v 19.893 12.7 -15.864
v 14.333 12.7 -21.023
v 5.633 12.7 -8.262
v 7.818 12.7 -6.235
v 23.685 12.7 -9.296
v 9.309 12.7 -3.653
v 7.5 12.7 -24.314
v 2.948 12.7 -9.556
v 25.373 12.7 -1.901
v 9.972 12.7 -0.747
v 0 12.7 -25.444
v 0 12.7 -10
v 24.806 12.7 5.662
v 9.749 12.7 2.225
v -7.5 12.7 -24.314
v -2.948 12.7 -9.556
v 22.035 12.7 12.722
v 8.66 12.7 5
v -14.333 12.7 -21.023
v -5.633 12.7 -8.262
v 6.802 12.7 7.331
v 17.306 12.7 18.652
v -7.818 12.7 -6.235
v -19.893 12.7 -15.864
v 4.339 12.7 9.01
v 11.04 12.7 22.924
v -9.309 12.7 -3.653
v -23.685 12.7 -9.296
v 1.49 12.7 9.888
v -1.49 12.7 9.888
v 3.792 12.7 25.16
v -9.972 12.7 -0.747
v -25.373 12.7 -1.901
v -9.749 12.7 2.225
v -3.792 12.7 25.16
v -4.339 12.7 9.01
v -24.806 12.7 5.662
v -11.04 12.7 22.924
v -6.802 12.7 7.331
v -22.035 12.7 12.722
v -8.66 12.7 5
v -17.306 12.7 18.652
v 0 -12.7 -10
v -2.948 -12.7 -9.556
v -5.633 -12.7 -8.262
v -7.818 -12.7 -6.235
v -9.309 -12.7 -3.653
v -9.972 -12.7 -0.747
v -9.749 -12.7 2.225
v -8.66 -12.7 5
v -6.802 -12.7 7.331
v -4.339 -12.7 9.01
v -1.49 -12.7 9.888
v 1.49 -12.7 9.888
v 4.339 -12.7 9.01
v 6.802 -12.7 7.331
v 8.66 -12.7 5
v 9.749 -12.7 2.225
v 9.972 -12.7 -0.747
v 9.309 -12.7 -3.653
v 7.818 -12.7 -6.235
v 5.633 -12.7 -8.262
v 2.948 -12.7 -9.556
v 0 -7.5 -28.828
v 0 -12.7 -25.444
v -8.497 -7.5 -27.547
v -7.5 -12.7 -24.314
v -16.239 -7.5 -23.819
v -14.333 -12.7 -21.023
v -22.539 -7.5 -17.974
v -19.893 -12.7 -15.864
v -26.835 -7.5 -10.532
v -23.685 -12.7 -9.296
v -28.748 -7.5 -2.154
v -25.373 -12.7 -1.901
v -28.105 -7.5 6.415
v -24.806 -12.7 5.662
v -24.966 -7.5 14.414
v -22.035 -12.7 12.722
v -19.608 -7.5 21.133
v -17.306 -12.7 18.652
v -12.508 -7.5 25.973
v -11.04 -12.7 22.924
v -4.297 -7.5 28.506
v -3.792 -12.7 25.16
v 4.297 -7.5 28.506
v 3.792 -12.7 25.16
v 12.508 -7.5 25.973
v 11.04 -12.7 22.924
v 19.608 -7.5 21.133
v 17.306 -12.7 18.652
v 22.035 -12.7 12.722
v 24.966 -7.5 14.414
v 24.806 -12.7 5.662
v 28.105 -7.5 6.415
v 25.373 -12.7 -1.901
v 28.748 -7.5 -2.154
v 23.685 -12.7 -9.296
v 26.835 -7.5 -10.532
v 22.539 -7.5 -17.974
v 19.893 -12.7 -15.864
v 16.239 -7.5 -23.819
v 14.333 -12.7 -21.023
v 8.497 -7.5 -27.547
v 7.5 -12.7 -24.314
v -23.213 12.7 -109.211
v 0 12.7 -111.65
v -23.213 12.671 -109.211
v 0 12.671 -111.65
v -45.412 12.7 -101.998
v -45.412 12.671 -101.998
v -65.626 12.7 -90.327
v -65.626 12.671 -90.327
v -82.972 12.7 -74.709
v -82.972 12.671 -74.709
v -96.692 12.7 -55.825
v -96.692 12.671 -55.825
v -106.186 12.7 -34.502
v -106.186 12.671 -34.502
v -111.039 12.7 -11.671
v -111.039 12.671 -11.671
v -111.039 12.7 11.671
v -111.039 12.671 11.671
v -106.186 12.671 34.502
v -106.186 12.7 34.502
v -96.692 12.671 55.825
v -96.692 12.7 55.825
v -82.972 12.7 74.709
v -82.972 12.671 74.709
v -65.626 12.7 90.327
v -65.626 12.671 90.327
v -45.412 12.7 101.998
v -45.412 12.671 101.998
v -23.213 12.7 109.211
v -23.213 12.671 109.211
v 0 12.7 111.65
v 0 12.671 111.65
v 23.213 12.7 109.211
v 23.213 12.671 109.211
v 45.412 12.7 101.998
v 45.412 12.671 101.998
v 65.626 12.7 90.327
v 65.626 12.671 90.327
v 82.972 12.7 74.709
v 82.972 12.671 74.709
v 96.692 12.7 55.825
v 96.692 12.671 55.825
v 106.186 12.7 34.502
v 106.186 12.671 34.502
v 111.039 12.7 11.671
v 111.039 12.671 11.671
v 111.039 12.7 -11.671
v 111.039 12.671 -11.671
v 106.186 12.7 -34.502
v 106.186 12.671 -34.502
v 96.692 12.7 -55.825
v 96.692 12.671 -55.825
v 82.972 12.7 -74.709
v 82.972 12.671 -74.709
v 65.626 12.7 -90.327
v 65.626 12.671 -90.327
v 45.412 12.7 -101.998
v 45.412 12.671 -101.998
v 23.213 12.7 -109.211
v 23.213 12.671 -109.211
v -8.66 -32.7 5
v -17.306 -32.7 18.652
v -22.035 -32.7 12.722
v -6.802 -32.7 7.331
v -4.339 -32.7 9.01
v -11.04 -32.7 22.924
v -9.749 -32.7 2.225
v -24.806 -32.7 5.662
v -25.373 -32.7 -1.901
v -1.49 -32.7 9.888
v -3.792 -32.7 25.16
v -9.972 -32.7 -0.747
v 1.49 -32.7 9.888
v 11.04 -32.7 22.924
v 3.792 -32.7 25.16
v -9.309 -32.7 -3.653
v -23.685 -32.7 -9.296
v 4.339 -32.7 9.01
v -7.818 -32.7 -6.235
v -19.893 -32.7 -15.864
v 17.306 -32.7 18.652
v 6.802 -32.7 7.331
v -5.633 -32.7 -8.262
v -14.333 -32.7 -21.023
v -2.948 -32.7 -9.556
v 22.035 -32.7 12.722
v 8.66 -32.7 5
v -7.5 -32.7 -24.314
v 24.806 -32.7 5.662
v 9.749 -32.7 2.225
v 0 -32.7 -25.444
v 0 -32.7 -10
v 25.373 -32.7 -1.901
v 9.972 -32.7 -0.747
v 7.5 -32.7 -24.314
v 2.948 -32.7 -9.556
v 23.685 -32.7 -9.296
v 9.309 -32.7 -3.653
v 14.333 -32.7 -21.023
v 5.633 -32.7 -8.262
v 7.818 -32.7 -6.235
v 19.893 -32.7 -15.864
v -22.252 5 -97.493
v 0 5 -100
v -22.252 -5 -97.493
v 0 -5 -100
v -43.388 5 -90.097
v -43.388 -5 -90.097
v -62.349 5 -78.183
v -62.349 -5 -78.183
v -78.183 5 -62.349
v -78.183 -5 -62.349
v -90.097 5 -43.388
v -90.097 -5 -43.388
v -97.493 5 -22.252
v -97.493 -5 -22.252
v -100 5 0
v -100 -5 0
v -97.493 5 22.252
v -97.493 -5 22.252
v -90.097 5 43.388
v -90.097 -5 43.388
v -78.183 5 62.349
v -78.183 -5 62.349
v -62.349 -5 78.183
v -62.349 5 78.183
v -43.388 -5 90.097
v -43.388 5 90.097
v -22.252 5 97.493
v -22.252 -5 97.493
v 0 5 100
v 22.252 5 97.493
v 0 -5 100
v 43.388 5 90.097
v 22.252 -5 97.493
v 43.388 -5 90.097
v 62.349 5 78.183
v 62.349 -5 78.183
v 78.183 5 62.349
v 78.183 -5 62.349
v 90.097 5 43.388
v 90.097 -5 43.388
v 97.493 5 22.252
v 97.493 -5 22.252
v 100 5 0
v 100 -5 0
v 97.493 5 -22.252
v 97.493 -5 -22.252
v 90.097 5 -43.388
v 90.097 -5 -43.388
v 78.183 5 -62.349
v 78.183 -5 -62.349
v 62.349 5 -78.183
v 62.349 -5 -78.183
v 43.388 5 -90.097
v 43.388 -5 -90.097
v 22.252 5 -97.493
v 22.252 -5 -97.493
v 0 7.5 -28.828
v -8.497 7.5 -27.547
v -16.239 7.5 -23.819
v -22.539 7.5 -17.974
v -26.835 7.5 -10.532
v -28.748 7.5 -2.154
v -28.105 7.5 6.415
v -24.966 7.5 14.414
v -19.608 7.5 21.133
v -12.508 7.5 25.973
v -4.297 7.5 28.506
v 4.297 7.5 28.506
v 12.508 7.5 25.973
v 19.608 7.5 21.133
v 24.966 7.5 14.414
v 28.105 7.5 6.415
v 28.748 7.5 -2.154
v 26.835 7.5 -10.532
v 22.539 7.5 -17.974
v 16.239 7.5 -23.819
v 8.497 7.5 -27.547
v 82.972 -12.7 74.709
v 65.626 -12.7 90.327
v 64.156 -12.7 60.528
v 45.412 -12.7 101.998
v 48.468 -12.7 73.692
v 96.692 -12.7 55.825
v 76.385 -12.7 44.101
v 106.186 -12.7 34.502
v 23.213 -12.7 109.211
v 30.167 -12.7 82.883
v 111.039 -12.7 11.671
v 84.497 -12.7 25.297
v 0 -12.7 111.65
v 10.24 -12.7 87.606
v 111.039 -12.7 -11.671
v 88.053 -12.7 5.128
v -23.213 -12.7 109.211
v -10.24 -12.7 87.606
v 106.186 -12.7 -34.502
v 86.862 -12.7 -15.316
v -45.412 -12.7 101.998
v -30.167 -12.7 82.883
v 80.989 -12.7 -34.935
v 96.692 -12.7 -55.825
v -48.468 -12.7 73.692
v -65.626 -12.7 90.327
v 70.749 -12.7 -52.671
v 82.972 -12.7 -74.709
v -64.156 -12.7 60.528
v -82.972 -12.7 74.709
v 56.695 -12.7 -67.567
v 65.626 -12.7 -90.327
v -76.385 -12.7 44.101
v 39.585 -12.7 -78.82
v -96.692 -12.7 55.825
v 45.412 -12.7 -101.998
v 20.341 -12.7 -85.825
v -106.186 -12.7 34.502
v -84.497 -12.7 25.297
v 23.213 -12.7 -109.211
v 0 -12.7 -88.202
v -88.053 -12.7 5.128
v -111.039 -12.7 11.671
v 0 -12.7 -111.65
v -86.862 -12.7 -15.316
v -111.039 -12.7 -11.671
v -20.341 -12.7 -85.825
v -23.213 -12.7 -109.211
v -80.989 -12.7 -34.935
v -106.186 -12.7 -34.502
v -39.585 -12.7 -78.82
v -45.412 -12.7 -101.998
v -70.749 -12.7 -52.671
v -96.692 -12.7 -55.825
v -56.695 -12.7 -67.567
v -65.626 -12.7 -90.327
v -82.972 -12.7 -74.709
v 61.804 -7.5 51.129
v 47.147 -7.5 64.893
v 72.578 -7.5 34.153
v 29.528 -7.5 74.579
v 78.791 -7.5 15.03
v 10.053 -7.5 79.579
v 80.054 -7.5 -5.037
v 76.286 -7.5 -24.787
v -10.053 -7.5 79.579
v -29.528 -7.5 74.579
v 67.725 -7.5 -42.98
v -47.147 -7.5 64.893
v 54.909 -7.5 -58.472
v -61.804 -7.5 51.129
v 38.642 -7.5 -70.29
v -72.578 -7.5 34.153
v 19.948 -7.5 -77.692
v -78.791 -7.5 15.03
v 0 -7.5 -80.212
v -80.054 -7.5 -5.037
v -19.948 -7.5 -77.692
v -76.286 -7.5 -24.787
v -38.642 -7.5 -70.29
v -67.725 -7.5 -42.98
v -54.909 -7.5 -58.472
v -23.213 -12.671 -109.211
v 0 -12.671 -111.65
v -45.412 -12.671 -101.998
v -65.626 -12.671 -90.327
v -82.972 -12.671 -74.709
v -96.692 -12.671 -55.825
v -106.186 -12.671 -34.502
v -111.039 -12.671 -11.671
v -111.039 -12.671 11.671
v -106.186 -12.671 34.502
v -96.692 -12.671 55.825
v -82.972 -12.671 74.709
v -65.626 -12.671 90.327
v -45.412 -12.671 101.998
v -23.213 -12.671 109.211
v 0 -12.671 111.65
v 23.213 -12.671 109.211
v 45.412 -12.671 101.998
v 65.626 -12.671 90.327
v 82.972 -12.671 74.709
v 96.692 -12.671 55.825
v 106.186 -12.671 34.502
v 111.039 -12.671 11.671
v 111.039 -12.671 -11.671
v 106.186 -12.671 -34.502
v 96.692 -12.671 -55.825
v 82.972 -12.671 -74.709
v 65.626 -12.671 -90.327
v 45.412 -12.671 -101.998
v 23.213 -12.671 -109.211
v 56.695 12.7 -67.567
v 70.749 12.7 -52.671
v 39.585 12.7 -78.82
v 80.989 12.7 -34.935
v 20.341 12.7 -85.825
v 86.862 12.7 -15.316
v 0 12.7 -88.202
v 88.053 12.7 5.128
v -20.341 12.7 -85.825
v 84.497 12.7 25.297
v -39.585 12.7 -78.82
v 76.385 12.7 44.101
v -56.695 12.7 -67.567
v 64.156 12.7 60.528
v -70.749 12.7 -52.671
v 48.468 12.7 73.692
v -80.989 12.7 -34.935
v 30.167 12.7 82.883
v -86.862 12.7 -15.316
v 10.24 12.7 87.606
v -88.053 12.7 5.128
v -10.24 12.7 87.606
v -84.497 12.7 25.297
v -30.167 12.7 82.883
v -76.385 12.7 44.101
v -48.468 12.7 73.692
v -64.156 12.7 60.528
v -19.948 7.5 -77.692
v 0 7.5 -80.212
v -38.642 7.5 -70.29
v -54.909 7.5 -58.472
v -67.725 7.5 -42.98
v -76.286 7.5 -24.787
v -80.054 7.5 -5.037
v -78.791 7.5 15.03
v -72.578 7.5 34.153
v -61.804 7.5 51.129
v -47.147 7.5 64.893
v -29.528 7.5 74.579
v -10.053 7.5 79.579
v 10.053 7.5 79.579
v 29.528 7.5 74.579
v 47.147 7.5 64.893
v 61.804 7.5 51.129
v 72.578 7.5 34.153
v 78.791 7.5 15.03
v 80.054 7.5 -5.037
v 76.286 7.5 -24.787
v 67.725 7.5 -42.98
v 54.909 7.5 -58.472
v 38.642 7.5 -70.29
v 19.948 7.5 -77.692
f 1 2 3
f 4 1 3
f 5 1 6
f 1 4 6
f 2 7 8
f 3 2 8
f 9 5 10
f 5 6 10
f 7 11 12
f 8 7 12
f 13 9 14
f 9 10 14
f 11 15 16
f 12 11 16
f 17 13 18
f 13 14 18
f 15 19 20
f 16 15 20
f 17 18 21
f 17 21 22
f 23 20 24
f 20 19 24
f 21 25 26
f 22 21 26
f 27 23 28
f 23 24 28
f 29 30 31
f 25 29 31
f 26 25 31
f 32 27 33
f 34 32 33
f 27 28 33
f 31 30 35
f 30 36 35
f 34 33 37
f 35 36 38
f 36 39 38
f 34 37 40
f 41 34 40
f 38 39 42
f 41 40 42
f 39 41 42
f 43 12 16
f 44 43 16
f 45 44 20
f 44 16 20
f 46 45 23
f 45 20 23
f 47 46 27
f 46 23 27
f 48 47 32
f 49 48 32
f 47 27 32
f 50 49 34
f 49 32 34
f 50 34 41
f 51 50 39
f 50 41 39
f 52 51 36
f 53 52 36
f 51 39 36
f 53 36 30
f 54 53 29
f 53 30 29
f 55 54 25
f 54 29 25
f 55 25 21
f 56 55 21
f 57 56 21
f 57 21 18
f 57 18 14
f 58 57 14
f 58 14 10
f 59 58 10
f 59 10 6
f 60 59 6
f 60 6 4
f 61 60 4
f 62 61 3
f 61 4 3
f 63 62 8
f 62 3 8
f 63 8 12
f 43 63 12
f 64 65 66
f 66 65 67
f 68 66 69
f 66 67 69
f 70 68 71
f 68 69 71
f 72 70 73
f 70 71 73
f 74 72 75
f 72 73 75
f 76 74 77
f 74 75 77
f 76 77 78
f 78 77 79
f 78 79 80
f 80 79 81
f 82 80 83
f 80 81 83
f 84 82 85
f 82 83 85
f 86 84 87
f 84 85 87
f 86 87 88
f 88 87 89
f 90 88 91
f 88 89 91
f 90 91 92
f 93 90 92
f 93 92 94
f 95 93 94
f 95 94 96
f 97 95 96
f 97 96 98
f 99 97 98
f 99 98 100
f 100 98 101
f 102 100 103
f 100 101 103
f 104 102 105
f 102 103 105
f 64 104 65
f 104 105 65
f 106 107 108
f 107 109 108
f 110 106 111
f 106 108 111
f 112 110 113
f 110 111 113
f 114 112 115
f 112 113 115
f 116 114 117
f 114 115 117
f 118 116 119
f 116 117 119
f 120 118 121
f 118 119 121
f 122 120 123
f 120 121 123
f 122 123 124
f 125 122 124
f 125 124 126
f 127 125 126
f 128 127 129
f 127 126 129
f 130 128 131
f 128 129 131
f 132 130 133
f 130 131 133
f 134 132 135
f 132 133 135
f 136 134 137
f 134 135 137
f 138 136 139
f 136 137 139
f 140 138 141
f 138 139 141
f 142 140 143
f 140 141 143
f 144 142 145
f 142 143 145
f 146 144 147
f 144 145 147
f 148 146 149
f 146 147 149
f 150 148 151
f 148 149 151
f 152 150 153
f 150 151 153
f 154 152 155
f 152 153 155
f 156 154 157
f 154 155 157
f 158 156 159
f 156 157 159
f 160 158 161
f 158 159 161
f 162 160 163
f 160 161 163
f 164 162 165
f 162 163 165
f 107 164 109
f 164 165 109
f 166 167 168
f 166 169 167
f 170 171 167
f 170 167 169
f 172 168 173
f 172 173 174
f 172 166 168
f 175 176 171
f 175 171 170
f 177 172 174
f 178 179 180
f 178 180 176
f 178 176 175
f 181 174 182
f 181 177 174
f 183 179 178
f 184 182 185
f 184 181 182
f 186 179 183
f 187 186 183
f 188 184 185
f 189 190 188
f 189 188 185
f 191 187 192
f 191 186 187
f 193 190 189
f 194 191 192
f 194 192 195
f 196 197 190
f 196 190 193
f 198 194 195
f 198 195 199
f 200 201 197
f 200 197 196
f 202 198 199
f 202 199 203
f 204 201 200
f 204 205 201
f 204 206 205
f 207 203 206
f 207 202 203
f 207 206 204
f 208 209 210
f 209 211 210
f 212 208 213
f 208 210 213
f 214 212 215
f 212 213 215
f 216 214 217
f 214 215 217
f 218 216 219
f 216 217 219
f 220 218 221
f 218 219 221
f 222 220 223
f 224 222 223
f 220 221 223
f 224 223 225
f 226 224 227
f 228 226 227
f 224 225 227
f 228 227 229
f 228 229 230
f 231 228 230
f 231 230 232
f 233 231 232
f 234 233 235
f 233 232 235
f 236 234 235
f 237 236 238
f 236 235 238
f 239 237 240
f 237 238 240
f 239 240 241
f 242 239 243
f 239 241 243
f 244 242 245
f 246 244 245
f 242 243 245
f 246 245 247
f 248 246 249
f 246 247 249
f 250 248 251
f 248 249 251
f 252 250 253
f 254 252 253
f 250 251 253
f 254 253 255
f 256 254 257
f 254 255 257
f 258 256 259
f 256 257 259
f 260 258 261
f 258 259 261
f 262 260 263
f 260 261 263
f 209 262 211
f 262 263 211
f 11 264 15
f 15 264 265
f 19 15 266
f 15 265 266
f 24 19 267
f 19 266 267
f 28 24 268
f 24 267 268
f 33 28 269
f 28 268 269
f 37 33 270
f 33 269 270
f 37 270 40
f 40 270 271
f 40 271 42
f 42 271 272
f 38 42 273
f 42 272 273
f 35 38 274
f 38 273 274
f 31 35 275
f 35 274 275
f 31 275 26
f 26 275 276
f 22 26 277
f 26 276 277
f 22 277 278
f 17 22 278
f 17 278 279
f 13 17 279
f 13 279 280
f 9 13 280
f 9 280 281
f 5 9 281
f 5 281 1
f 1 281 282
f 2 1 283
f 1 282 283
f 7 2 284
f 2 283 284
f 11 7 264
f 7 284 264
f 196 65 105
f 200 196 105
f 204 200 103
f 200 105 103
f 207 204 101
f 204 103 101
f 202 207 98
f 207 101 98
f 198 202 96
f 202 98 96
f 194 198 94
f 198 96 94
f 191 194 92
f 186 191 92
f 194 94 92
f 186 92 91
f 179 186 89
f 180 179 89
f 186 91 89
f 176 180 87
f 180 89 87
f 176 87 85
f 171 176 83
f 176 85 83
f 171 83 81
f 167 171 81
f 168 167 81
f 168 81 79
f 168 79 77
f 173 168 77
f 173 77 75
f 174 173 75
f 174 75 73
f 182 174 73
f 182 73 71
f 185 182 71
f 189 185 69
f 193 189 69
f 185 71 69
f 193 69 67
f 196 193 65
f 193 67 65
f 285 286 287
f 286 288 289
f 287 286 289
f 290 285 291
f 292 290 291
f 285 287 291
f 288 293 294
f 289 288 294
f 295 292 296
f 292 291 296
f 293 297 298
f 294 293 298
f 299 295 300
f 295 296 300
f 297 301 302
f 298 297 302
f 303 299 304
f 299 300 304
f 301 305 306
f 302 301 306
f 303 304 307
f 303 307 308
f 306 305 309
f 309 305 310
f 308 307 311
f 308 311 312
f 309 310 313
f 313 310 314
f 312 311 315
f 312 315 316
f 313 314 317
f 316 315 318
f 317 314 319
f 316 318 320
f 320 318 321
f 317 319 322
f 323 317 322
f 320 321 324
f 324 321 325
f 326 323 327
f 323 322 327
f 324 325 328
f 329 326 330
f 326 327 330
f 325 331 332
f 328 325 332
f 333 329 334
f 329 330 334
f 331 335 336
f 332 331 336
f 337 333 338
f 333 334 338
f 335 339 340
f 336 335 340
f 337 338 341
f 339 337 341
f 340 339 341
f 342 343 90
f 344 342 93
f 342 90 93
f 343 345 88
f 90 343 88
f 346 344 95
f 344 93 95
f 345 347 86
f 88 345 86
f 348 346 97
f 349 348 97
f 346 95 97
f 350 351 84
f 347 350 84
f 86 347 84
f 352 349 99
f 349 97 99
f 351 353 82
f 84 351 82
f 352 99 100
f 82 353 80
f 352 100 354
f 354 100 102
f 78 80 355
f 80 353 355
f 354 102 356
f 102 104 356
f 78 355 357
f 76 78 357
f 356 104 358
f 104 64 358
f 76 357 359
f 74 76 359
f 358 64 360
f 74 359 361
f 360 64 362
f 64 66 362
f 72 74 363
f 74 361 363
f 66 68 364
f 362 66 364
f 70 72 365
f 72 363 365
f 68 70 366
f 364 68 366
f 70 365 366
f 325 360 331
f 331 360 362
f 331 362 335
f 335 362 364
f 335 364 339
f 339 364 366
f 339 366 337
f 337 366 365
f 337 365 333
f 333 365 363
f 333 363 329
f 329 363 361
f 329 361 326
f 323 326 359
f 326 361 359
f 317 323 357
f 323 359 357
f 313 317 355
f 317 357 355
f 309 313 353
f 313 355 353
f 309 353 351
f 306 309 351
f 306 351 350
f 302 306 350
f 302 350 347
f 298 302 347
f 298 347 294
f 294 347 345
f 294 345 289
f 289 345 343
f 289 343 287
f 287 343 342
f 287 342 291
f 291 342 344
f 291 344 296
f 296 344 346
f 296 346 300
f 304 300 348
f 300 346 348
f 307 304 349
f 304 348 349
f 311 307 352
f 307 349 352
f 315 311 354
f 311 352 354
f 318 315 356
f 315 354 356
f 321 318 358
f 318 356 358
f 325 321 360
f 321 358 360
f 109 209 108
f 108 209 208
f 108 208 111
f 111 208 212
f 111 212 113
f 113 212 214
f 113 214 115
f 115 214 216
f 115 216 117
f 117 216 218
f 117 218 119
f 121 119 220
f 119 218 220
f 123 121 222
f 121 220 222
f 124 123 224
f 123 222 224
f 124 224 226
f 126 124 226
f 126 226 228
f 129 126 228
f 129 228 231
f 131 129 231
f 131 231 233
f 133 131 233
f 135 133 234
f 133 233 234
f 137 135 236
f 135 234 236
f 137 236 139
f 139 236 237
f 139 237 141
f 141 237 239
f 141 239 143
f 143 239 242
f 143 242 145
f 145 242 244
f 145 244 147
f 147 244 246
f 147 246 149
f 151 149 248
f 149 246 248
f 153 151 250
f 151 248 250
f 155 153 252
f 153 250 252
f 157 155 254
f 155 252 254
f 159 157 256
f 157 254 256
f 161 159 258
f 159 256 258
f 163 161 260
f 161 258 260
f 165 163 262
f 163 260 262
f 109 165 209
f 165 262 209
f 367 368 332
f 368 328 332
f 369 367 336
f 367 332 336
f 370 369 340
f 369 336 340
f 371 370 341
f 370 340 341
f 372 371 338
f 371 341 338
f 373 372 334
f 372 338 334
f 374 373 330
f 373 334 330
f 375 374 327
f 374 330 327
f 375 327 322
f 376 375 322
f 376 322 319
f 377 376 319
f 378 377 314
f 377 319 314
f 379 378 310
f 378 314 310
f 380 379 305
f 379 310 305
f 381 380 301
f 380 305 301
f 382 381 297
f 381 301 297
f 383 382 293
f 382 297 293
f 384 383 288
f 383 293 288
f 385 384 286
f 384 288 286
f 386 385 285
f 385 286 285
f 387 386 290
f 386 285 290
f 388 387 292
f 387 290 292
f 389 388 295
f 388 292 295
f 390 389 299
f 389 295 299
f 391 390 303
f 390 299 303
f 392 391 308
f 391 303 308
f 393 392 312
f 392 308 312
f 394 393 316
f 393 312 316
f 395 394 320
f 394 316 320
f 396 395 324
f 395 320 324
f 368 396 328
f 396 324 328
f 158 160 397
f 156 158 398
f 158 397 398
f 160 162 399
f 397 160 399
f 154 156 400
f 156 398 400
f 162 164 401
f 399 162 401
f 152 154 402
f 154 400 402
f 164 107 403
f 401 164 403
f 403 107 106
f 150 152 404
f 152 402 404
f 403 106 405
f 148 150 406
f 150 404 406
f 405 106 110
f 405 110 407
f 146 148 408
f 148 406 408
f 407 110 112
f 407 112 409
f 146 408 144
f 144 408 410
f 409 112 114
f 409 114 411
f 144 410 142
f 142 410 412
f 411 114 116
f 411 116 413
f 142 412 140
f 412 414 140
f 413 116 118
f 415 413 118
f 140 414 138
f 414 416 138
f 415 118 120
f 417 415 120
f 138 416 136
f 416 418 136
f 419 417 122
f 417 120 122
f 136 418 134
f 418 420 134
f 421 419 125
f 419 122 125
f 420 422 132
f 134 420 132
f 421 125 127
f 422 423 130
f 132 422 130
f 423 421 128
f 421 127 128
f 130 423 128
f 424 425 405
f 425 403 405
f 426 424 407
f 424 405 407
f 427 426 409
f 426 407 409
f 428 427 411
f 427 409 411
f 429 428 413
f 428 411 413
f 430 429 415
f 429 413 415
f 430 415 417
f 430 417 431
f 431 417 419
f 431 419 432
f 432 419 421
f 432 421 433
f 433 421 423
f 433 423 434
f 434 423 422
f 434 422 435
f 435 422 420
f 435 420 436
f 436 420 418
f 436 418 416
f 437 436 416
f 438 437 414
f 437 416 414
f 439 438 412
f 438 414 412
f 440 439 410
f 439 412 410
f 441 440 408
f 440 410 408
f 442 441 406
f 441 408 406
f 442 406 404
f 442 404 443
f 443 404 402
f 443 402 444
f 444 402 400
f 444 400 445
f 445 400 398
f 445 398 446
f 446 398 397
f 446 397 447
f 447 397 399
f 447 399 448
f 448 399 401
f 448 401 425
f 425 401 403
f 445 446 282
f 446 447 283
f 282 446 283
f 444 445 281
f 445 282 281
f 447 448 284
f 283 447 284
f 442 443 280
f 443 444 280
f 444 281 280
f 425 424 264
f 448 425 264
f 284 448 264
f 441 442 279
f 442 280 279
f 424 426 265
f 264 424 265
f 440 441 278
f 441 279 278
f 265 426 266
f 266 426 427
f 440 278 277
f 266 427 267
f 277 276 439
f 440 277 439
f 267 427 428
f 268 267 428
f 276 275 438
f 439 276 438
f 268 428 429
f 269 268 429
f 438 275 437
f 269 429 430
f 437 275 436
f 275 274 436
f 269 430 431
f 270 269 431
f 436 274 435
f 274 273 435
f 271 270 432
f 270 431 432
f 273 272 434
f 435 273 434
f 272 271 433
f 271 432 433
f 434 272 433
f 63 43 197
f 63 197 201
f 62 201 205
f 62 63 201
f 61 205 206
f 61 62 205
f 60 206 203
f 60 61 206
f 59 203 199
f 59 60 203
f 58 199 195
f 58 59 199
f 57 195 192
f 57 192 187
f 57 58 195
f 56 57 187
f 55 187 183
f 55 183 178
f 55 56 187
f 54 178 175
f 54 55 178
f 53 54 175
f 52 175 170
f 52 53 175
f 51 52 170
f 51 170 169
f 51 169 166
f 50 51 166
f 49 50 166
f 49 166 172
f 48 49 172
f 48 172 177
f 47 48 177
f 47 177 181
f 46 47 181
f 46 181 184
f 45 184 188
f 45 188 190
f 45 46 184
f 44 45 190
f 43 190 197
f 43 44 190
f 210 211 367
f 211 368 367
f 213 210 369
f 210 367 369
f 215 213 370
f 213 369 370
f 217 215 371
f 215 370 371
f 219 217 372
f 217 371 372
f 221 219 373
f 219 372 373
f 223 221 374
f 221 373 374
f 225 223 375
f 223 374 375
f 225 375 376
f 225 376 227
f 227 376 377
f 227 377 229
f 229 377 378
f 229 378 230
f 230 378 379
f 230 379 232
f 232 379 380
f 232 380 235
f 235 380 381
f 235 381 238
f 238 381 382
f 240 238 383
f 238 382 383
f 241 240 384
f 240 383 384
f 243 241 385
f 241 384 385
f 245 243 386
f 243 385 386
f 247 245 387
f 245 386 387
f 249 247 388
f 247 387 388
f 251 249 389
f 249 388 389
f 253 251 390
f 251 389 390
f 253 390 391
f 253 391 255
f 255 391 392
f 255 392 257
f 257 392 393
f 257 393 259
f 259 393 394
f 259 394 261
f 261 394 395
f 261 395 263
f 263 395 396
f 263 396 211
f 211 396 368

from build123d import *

# Parameters (mm, degrees)
CROQUIS2_R              = 25.443991431
CROQUIS2_R_2            = 10
SALIENTE_EXTRUIR1_DEPTH = 20


with BuildPart() as part:
    # Croquis1 → Revolución1 (revolve)
    with BuildSketch(Plane.XY, mode=Mode.PRIVATE) as revoluci_n1_sk:
        Polygon((100, 5), (100, -5), (111.6503736, -12.670841247), (111.6503736, -12.7), (88.202160832, -12.7), (80.211990776, -7.5), (28.828149692, -7.5), (25.443991431, -12.7), (10, -12.7), (10, 12.7), (25.443991431, 12.7), (28.828149692, 7.5), (80.211990776, 7.5), (88.202160832, 12.7), (111.6503736, 12.7), (111.6503736, 12.670841247), align=None)
    revolve(revoluci_n1_sk.sketch.rotate(Axis((0, -23.836508292, 0), (0, 1, 0)), 90), axis=Axis((0, -23.836508292, 0), (0, 1, 0)))

    # Croquis2 → Saliente-Extruir1 (add)
    with BuildSketch(Plane.XZ.offset(12.7)):
        with Locations(Location((0, 0, 0), (0, 0, 270))):
            Circle(CROQUIS2_R)
        with Locations(Location((0, 0, 0), (0, 0, 270))):
            Circle(CROQUIS2_R_2, mode=Mode.SUBTRACT)
    extrude(amount=SALIENTE_EXTRUIR1_DEPTH)


solid = part.part
